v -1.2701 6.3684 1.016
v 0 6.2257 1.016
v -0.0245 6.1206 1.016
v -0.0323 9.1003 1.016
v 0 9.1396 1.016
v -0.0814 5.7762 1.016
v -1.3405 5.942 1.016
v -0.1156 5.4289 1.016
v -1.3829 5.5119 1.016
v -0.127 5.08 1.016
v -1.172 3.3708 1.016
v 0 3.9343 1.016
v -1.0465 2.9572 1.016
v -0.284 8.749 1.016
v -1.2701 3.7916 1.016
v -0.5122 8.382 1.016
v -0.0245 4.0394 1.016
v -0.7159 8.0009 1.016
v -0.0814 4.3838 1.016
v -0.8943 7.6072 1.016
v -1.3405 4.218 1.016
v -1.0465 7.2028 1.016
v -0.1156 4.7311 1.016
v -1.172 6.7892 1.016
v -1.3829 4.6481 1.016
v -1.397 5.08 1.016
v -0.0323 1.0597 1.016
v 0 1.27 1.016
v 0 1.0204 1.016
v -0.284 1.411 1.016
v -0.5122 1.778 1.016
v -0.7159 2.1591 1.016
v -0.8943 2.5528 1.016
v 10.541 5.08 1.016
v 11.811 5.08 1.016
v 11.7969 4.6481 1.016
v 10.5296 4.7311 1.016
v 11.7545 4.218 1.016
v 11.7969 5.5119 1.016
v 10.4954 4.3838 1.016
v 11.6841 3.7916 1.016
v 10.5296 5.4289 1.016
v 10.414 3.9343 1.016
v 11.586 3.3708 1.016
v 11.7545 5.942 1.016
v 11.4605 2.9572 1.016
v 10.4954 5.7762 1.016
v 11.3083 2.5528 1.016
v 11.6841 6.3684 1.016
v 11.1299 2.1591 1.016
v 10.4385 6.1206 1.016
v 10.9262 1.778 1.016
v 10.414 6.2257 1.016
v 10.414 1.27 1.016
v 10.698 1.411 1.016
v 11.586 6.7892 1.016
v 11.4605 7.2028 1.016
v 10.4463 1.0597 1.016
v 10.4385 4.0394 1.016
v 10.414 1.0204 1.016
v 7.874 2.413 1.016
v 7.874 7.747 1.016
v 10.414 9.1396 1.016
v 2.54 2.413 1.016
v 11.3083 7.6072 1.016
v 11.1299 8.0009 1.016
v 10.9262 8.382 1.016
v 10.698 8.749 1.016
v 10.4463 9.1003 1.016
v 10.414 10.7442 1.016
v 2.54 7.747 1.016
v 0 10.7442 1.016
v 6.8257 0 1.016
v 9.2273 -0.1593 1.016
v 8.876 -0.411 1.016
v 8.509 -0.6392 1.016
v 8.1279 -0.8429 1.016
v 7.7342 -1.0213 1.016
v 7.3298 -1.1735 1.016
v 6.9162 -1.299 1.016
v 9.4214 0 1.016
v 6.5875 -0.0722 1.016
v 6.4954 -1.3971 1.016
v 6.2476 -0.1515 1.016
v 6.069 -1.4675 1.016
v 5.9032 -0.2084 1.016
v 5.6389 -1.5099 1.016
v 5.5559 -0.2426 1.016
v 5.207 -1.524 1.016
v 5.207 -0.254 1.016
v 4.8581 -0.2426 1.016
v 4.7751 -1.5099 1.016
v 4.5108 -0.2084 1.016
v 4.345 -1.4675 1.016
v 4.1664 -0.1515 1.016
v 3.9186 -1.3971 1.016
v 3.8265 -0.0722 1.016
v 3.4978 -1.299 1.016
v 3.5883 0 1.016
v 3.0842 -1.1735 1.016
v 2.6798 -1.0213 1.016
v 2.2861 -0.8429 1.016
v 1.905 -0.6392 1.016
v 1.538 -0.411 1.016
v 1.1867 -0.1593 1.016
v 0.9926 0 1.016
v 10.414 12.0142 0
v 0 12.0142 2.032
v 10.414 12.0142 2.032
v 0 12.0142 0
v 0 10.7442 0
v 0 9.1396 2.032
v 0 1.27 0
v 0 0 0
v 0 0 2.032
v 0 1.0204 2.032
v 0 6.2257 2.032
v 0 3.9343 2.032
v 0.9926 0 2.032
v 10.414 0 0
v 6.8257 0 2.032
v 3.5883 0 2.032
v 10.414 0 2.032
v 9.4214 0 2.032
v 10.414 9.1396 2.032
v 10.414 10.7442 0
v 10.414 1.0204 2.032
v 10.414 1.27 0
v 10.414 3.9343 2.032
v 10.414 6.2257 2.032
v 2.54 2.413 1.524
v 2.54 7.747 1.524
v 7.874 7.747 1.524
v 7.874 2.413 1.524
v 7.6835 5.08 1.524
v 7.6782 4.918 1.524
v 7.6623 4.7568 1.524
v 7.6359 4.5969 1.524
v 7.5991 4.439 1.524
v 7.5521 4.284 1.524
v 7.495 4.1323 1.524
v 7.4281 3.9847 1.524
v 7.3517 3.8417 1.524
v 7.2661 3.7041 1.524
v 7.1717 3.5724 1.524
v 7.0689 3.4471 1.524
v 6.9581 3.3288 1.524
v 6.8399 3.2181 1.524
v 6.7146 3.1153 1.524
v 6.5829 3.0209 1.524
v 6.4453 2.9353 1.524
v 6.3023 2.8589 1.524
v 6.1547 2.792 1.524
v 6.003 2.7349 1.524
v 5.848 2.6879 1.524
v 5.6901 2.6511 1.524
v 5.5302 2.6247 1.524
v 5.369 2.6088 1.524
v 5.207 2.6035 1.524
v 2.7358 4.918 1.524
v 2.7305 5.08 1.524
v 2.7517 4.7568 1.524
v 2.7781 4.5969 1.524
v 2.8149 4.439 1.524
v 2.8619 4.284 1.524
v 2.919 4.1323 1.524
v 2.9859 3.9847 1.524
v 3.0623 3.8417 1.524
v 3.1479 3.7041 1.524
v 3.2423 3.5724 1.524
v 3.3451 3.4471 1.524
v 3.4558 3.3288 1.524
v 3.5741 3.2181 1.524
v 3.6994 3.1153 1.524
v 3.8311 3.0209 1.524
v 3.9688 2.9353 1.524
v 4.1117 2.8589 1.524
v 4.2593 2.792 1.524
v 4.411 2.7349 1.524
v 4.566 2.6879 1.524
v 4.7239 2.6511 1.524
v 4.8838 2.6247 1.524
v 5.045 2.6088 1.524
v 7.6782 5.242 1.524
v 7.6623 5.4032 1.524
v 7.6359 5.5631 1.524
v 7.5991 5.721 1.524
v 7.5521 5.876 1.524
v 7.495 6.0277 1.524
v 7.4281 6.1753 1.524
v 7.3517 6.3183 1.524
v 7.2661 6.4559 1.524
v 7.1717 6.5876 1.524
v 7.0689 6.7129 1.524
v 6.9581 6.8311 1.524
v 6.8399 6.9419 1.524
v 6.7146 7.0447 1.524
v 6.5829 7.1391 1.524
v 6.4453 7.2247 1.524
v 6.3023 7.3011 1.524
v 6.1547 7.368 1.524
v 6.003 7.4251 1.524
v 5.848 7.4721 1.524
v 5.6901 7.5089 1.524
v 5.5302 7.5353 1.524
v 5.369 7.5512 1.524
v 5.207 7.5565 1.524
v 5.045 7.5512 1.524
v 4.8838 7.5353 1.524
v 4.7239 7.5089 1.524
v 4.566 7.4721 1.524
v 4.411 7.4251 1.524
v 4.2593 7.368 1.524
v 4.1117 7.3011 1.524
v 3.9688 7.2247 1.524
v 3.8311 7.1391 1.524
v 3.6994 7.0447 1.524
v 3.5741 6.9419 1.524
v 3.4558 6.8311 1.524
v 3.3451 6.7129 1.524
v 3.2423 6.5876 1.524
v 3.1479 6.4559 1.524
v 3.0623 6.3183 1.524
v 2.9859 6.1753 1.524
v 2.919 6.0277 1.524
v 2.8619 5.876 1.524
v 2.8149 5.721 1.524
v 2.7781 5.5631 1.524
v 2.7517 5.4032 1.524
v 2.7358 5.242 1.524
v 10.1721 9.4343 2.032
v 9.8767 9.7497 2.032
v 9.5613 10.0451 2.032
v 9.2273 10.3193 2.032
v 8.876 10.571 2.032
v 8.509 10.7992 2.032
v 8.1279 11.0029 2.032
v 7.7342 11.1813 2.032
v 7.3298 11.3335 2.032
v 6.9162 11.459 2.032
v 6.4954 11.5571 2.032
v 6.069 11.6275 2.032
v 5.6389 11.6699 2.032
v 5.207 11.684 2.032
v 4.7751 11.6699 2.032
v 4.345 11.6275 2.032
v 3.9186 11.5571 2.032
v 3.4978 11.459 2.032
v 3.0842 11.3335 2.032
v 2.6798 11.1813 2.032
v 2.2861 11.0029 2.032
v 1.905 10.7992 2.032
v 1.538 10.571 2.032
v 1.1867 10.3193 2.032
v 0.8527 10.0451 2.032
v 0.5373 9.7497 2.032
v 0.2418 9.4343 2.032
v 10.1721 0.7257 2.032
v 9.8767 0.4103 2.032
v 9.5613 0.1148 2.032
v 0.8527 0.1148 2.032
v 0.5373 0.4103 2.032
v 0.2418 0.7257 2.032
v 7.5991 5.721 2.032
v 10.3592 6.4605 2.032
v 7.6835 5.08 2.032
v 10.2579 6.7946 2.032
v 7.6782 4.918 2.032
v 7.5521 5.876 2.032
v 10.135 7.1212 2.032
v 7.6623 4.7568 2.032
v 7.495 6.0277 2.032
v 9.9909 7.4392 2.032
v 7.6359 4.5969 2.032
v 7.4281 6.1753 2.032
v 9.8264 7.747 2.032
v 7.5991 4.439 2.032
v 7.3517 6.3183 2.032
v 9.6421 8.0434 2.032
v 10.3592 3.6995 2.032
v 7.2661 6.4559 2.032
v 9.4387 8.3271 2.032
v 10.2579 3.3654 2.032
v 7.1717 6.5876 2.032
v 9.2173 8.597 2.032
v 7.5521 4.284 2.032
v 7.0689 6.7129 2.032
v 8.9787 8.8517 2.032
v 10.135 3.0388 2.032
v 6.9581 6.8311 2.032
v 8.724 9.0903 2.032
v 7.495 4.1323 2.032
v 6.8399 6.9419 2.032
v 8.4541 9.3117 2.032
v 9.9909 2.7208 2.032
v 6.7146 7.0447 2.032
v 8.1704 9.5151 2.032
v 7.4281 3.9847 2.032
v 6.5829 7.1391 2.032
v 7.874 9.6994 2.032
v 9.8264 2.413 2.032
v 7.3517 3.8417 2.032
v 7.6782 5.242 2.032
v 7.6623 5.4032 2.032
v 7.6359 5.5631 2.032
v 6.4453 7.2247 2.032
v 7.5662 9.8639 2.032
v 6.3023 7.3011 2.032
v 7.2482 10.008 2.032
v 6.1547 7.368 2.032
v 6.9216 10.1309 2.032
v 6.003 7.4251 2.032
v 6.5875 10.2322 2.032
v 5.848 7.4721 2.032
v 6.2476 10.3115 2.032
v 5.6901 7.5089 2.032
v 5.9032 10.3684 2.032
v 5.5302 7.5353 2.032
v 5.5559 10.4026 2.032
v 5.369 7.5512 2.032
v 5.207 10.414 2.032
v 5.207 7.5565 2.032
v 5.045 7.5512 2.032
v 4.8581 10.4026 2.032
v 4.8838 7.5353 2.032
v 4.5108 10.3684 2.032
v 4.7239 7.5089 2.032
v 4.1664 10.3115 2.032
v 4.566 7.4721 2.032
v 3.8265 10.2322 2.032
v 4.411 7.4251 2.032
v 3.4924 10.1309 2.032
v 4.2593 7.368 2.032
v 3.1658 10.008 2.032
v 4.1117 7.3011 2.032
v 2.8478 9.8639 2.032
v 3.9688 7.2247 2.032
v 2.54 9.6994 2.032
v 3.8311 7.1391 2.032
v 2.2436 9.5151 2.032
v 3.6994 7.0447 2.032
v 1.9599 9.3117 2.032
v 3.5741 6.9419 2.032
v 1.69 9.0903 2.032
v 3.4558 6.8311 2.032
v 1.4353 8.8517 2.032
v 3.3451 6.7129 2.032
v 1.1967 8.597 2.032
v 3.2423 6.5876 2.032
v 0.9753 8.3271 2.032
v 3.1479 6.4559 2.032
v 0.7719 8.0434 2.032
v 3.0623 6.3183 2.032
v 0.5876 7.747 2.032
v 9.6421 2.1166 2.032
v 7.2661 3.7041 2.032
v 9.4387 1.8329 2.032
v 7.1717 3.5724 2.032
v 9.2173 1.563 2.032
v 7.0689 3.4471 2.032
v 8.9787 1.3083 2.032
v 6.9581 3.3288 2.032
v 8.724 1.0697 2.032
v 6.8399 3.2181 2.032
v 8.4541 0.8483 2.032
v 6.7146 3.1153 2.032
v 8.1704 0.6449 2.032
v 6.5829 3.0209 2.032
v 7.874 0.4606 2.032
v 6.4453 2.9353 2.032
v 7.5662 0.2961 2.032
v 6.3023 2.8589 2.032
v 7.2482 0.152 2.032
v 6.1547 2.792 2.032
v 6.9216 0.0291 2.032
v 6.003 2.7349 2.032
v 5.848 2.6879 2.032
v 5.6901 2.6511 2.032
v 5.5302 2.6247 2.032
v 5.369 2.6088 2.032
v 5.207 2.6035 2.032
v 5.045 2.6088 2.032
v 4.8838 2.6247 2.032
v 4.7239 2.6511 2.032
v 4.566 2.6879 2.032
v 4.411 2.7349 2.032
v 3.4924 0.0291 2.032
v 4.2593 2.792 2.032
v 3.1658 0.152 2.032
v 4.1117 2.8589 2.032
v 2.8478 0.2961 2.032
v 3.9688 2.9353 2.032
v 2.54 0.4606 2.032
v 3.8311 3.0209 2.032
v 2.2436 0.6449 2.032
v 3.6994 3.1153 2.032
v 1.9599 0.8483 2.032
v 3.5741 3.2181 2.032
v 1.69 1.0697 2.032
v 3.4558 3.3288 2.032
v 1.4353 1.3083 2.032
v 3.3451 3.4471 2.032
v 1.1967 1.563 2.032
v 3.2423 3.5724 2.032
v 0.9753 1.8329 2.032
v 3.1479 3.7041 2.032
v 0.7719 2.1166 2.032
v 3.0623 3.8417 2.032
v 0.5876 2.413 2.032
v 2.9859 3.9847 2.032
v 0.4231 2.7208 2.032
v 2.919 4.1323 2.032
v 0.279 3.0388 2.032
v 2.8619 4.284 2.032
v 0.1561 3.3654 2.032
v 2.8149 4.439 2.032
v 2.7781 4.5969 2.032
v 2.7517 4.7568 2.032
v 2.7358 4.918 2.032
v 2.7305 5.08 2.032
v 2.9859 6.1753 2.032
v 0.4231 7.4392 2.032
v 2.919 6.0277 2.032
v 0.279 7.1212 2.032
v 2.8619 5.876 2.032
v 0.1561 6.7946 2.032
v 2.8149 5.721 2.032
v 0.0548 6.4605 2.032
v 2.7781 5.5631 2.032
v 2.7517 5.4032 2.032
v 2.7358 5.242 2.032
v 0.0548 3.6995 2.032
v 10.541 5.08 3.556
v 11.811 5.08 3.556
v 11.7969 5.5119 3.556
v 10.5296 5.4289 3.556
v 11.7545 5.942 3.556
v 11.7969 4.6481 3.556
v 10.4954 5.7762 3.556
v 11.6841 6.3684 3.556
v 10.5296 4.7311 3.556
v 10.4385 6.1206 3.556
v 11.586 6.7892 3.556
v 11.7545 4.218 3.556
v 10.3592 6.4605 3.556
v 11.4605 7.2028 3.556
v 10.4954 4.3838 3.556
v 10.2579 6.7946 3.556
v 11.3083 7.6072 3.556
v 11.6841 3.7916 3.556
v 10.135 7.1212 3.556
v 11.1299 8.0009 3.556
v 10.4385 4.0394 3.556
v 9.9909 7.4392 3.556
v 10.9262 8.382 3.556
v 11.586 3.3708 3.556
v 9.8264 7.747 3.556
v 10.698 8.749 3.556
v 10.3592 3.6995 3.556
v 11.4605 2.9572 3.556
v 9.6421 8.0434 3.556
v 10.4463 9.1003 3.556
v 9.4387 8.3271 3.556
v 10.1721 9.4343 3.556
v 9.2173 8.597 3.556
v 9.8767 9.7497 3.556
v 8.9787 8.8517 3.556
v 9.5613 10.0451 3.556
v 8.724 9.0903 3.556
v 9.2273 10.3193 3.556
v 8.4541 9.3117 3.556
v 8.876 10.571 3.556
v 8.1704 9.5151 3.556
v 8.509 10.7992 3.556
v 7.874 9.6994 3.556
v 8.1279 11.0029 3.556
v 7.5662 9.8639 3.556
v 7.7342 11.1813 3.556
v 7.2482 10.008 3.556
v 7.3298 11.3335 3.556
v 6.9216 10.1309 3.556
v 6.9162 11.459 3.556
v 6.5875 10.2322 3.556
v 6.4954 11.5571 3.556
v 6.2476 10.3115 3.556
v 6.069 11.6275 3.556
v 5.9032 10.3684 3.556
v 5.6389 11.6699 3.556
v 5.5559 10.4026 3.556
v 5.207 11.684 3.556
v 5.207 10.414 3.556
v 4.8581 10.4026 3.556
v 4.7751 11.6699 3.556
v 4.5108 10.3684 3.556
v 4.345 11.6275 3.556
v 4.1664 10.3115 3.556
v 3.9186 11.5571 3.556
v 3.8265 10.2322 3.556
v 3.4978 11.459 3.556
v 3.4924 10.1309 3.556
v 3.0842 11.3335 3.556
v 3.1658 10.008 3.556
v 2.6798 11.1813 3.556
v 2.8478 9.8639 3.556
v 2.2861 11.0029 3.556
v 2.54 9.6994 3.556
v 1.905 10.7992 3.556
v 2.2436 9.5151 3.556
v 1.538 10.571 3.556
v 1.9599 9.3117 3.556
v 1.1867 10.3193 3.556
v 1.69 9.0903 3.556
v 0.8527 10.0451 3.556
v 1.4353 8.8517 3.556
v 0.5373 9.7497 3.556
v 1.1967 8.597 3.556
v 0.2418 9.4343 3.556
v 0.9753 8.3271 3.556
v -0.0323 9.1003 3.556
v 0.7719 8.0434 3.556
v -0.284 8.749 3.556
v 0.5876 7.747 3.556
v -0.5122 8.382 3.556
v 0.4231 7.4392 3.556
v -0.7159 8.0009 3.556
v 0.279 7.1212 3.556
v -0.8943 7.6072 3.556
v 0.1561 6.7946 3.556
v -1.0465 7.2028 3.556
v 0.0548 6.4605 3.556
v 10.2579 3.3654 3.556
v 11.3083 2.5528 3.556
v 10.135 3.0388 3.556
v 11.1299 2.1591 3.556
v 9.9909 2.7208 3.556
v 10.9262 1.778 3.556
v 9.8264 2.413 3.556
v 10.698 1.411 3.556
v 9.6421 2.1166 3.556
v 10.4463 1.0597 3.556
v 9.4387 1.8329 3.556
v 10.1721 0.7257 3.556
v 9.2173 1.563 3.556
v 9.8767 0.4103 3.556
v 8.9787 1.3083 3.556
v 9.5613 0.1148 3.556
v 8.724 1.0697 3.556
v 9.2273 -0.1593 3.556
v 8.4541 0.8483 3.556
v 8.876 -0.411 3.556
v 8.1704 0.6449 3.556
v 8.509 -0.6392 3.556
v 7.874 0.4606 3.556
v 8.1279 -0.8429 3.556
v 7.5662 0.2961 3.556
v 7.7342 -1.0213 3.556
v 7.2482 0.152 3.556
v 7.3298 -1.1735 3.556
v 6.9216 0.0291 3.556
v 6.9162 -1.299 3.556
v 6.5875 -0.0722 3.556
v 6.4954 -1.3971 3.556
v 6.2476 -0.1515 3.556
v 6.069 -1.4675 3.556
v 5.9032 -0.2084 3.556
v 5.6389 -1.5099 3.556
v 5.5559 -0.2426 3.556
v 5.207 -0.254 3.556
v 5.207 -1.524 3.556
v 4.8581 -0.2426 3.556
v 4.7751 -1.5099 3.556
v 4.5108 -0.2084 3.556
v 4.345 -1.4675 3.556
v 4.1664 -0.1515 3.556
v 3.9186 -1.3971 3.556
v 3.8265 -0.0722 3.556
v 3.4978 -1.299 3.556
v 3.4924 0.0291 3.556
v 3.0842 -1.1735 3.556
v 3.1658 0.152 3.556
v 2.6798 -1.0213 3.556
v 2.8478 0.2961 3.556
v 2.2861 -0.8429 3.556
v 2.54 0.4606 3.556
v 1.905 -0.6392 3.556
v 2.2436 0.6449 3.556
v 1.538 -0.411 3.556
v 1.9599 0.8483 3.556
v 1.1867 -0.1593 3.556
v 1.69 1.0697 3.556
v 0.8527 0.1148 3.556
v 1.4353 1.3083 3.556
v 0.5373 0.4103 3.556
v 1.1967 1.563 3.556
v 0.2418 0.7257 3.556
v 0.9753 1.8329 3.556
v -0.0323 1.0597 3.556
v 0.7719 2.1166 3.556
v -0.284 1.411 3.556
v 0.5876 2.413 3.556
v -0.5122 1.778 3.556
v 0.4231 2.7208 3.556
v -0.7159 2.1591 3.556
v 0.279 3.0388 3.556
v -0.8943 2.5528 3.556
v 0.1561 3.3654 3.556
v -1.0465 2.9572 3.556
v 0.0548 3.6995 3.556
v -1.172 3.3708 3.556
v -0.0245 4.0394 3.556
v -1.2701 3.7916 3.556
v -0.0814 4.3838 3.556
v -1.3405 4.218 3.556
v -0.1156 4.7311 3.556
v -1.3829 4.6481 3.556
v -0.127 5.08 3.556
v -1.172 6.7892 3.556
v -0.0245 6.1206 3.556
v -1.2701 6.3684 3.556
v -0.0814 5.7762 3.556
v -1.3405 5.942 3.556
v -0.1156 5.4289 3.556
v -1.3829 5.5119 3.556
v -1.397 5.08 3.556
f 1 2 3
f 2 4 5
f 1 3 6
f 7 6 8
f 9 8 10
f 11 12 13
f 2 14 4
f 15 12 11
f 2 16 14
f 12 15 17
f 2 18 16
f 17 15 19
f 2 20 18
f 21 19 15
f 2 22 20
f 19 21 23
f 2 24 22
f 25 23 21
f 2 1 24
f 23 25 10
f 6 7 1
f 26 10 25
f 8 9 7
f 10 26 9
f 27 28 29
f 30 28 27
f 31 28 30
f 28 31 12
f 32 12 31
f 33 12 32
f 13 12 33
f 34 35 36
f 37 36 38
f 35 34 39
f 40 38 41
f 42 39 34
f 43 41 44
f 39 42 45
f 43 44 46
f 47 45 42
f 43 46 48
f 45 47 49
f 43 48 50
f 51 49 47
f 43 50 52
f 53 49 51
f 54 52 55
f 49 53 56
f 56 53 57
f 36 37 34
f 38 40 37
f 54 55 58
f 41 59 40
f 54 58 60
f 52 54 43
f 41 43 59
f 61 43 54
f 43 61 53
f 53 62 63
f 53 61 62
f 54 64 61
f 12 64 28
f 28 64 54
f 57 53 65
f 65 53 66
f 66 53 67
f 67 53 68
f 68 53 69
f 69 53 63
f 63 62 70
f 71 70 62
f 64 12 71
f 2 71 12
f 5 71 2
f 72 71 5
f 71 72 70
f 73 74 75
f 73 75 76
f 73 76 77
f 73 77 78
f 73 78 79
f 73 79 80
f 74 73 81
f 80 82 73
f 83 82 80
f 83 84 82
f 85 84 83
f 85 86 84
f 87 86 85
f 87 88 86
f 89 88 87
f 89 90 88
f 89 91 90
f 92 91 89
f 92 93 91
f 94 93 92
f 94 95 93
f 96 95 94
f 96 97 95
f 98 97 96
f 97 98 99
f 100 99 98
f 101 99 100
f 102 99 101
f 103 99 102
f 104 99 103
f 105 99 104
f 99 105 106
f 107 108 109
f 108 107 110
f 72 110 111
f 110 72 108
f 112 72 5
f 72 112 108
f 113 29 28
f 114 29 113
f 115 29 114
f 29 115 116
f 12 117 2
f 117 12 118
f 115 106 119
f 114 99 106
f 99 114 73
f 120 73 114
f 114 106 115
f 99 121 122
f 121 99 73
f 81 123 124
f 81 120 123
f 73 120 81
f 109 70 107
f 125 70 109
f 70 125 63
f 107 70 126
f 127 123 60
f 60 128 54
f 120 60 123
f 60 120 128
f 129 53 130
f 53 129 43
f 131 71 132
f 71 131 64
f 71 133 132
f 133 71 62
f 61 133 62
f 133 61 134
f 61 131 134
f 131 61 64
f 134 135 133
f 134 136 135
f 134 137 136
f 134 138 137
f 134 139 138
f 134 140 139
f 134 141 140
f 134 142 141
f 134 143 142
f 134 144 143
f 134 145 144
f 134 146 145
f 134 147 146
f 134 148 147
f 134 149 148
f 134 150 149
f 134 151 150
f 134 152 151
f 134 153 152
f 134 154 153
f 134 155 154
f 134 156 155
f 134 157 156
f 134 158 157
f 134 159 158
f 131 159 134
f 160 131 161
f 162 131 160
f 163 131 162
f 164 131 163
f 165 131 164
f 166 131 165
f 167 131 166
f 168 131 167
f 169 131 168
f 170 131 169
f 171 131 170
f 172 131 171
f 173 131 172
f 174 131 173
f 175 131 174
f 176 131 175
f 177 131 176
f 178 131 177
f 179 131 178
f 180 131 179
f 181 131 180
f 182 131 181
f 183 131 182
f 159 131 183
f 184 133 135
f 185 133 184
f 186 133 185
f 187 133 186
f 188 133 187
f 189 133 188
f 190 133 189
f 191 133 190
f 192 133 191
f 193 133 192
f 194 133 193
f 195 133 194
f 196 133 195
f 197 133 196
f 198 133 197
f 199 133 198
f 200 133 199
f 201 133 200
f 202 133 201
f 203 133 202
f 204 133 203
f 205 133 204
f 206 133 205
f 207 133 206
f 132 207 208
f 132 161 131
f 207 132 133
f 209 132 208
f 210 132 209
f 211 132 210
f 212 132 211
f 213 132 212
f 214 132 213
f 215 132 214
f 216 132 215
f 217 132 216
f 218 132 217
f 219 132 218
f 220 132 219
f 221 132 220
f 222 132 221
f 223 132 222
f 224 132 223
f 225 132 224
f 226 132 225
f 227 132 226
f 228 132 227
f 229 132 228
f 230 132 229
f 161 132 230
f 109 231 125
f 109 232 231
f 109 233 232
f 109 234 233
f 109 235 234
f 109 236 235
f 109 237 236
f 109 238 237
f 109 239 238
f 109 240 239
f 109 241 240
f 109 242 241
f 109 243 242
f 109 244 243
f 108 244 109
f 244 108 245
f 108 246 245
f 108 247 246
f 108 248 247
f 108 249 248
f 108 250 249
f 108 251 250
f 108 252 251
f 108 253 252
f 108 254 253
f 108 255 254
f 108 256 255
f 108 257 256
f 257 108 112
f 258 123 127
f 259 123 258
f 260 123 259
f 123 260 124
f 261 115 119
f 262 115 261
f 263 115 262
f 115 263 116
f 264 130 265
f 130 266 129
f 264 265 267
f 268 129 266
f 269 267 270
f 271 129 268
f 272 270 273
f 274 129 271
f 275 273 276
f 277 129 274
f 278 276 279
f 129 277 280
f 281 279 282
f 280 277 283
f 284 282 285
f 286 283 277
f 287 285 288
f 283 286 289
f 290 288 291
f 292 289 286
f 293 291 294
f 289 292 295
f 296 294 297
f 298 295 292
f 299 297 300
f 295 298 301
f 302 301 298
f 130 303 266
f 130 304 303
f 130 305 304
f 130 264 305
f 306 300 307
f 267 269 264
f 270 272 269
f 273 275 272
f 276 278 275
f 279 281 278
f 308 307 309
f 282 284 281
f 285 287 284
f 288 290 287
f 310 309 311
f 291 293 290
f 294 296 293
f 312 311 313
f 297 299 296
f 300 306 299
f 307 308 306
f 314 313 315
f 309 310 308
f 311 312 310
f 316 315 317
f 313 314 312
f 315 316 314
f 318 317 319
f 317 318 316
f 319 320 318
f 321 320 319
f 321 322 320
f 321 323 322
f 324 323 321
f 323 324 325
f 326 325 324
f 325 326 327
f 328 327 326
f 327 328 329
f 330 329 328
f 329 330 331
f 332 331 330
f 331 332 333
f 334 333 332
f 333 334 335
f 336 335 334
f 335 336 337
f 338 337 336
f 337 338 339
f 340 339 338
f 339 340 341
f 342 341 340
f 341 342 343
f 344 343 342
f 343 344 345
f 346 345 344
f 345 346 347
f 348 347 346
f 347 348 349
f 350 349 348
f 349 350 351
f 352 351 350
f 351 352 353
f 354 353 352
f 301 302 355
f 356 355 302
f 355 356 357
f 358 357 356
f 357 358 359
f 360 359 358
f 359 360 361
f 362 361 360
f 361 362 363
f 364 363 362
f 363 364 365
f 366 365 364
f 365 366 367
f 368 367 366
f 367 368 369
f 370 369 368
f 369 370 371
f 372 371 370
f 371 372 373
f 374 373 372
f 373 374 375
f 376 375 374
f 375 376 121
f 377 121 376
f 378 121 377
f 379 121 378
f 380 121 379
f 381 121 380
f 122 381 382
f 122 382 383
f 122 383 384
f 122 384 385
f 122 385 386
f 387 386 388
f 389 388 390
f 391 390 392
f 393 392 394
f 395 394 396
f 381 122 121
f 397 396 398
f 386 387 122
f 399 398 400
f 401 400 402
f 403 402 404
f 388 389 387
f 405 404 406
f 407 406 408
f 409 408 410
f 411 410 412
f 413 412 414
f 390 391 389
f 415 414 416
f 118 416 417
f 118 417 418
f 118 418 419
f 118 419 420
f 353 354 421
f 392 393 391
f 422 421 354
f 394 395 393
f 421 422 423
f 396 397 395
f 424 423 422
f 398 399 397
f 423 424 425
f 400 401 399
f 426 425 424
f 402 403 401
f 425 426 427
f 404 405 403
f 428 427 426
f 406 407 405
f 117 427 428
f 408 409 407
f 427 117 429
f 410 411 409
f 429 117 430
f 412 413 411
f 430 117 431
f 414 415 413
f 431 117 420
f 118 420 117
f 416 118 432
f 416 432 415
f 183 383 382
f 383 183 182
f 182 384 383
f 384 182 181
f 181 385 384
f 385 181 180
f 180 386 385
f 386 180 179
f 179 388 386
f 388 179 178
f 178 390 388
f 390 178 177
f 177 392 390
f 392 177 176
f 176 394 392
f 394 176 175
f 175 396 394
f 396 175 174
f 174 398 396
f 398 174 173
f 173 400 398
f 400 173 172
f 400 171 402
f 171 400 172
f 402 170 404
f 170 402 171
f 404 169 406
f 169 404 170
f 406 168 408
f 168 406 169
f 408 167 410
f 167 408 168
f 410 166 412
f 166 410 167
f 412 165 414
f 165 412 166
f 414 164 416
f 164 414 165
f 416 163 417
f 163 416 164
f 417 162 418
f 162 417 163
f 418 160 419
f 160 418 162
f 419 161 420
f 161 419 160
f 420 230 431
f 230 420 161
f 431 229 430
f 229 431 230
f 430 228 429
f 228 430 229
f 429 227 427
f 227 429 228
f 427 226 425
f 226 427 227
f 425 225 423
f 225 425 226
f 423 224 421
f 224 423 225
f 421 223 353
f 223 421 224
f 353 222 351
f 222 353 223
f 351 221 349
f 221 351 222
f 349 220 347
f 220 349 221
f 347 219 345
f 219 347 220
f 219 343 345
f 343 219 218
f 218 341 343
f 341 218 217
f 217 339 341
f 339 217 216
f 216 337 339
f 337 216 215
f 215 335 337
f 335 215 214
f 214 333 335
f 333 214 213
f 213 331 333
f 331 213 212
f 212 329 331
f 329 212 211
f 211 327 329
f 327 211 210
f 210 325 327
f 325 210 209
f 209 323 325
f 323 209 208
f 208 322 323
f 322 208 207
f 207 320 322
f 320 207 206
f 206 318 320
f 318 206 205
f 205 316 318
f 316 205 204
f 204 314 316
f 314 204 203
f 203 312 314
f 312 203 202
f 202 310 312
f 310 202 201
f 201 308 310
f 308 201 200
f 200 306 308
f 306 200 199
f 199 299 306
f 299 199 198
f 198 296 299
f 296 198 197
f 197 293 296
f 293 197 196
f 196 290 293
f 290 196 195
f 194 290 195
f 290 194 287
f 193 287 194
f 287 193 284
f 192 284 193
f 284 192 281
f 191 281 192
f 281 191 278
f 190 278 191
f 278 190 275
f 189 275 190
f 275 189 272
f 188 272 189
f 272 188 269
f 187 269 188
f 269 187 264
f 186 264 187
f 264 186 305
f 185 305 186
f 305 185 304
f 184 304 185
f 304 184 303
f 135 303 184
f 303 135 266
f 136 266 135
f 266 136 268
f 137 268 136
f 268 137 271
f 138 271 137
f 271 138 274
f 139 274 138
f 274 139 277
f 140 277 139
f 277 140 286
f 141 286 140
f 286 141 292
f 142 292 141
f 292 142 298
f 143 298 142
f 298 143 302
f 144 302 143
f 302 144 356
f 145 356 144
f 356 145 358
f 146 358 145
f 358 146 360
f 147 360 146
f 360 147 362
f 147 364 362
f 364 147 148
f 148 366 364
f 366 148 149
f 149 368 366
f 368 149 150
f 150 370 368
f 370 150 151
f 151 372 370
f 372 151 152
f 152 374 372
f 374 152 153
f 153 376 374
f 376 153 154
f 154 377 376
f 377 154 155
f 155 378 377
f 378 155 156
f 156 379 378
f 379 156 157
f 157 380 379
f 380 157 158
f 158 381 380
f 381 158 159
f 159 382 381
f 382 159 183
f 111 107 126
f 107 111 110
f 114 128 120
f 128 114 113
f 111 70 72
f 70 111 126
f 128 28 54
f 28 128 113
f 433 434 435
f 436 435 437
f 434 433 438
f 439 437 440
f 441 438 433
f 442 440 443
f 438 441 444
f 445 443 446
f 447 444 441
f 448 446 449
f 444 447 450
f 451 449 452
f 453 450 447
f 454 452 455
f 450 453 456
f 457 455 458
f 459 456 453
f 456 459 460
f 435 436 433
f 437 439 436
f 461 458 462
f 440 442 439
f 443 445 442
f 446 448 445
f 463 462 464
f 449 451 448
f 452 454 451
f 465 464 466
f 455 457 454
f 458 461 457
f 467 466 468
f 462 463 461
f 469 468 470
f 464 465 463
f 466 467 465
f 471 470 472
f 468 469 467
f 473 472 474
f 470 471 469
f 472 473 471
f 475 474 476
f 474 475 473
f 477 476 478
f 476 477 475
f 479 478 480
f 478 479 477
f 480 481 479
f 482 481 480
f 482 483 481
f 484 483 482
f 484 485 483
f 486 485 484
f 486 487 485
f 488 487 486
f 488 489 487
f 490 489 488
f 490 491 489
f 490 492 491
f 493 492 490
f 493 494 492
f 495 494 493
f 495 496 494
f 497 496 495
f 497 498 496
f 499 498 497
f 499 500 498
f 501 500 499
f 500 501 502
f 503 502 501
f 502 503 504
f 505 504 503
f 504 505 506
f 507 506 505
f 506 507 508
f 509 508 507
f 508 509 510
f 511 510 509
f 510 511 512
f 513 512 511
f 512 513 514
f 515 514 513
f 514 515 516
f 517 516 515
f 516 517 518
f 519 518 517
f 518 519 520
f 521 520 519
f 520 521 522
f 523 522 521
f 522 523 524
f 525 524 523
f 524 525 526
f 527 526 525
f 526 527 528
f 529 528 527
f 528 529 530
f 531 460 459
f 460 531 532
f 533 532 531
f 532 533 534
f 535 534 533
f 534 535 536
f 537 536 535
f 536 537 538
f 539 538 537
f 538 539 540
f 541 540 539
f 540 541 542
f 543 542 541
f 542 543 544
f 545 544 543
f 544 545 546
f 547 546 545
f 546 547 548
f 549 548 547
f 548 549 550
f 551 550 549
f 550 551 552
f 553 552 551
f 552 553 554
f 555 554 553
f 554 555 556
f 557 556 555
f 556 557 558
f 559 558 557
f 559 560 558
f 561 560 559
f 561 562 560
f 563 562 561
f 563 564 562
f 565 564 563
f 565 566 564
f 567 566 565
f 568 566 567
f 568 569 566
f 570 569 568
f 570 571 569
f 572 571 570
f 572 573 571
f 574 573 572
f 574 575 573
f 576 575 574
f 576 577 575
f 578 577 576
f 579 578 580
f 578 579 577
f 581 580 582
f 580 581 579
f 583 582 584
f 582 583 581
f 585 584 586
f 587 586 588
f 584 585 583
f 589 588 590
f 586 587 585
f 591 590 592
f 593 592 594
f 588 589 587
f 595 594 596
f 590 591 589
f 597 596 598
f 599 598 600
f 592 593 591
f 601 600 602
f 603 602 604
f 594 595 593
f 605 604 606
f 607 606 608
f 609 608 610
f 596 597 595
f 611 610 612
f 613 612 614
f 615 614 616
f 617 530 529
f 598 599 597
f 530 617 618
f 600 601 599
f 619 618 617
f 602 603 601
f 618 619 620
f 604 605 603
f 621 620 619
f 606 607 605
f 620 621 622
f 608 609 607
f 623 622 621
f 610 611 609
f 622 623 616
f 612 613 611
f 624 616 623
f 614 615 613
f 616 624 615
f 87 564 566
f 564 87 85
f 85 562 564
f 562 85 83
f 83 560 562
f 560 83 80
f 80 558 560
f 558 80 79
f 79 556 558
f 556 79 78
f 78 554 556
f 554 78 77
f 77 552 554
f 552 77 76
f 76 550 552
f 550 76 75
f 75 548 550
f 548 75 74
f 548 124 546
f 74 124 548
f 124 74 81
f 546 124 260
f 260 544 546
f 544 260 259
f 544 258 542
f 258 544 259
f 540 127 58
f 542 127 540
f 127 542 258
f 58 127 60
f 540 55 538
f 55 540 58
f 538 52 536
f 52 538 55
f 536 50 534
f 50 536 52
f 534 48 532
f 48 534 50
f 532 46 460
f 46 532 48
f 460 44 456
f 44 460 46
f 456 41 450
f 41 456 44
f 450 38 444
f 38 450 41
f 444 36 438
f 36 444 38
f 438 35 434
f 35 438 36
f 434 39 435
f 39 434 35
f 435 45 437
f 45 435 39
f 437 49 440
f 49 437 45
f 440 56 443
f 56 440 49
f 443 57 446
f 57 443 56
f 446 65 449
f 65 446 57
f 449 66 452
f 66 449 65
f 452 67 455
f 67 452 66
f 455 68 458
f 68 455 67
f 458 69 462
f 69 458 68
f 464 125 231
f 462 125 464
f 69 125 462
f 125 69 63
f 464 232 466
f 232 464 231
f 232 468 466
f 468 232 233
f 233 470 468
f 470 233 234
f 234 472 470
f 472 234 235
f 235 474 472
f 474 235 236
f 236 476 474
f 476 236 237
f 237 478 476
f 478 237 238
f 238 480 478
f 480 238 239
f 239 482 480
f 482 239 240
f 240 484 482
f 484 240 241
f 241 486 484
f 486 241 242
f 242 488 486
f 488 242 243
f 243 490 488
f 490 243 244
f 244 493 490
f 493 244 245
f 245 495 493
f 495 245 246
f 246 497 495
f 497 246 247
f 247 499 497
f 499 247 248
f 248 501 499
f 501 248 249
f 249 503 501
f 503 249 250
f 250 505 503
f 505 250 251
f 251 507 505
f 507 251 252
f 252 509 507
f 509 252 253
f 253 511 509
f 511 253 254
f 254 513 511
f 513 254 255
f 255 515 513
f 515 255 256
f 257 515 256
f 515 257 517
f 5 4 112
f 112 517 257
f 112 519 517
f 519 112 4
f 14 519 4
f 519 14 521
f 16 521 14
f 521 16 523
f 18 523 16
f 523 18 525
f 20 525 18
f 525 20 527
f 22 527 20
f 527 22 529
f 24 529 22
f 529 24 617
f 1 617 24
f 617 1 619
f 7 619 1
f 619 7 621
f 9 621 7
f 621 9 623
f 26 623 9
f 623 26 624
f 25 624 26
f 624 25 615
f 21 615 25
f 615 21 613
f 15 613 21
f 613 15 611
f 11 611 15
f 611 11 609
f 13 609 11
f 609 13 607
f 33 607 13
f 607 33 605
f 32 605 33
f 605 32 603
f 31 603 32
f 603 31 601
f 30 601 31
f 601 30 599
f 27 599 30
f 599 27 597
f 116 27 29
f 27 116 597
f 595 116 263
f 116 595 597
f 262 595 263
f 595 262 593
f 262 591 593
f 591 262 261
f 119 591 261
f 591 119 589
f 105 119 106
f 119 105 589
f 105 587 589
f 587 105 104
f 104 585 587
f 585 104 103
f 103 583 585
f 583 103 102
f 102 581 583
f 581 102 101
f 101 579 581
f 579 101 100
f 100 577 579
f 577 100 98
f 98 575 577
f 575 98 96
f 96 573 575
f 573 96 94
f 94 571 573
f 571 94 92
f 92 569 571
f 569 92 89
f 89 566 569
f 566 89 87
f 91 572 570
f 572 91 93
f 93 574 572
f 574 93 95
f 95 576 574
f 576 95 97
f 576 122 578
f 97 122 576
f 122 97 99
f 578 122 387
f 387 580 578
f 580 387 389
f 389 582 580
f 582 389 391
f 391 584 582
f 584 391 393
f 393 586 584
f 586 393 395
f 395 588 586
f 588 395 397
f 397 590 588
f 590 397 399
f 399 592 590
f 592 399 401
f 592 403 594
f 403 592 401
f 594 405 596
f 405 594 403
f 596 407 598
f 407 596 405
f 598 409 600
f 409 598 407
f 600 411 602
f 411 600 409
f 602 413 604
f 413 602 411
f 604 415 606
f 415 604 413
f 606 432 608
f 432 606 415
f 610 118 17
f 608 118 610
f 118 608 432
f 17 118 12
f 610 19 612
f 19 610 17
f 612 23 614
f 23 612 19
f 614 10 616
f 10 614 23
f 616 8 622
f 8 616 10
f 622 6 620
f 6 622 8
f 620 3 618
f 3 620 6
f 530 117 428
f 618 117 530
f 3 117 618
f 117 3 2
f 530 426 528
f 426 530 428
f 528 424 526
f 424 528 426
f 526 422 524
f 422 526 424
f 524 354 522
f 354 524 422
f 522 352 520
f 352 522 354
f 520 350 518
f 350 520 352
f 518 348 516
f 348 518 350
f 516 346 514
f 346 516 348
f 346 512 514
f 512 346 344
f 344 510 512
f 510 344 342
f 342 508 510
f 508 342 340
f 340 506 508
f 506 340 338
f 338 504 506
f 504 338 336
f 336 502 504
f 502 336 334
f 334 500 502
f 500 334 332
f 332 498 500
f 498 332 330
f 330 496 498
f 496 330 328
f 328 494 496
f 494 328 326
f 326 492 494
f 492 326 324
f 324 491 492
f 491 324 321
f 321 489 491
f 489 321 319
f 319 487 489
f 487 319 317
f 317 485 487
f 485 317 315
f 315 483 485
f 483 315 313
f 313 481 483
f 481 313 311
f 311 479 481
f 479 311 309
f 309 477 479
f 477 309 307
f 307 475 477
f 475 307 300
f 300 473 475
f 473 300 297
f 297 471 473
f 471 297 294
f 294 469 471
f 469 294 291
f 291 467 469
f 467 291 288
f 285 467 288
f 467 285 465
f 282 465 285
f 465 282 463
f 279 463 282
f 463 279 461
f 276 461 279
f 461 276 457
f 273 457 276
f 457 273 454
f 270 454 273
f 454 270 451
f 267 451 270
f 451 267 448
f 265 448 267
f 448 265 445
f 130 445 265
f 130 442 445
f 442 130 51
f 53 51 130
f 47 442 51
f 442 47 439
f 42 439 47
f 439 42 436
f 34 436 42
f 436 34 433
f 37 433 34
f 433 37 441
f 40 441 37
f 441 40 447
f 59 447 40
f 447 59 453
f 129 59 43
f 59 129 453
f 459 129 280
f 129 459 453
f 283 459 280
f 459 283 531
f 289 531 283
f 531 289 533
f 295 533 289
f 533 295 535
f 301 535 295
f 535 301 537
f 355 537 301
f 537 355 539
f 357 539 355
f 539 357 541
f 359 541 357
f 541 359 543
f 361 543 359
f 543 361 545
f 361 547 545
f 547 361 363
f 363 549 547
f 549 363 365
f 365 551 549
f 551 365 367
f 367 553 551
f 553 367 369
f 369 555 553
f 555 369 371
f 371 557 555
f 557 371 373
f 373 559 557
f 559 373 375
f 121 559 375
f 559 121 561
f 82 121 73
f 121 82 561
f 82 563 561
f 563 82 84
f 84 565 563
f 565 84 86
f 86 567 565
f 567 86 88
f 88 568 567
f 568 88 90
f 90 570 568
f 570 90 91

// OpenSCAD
// file: ../models/model_ws2812strip.scad
module model_ws2812strip(numleds = 1)
{
    for (ii = [0:1:numleds-1]) {
        echo(ii);
        translate([ii * 400, 0, 0]) {
        // Substrate
        if (modelcolor) color("white")
        linear_extrude(20)
        square([400, 473]);

        // LED
        if (modelcolor) color("beige")
        translate([100, 100, 19])
        linear_extrude(51)
        square([200, 200]);

        // Resistor
        if (modelcolor) color("tan")
        translate([150, 350, 19])
        linear_extrude(50)
        square([100, 30]);
        }

        if (modelcolor) {
            // Contacts
            color("gold")
            translate([0, 0, 20])
            linear_extrude(1) {
                for (ii=[120,240,360]) {
                    translate([360, ii, 0])
                    hull() {
                        circle(80/2);
                        translate([0, -40, 0])
                        square([40, 80]);
                    }
                }
                for (ii=[120,240,360]) {
                    translate([40, ii, 0])
                    rotate([0, 0, 180])
                    hull() {
                        circle(80/2);
                        translate([0, -40, 0])
                        square([40, 80]);
                    }
                }
            }

            // Outline
            color("black")
            translate([0, 0, 20])
            linear_extrude(1) 
            difference() {
                square([400, 473]);
                translate([5, 5, 0])
                square([390, 463]);
            }
        }
    }
}
// main file
ViewScale = [0.0254, 0.0254, 0.0254];
include <../models/model_ws2812strip.scad>

modelcolor=1;
models=0;

module ledstripcover(numleds = 1)
{

    for(ii=[0:1:numleds-1]) {
        translate([ii*410,0,0]) {
            // Square cutout
            translate([0, 0, 40])
            linear_extrude(21)
            difference() {
                square([410, 473]);
                translate([(410-210)/2, 95])
                square([210, 210]);
            }

            // Circle cutout
            translate([0, 0, 60])
            linear_extrude(20)
            difference() {
                square([410, 473]);
                translate([410/2, 200, 0])
                circle(195/2, $fn=96);
            }

            // Sides
            translate([0, 0, 0])
            linear_extrude(41)
            difference() {
                square([410, 473]);
                translate([(410-450)/2, (473-373)/2])
                square([450, 373]);
            }
        }
    }
}

module pylonmount()
{
    ledstripcover(1);
    translate([410/2, 200, 40])
    linear_extrude(100)
    difference() {
        circle(520/2, $fn=96);
        circle(420/2, $fn=96);
    }
}

module forViewing()
{
    if (models) {
        model_ws2812strip(1);
    }
    pylonmount();
}

module forPrinting()
{
}

scale(ViewScale)
{
    forViewing();
}
